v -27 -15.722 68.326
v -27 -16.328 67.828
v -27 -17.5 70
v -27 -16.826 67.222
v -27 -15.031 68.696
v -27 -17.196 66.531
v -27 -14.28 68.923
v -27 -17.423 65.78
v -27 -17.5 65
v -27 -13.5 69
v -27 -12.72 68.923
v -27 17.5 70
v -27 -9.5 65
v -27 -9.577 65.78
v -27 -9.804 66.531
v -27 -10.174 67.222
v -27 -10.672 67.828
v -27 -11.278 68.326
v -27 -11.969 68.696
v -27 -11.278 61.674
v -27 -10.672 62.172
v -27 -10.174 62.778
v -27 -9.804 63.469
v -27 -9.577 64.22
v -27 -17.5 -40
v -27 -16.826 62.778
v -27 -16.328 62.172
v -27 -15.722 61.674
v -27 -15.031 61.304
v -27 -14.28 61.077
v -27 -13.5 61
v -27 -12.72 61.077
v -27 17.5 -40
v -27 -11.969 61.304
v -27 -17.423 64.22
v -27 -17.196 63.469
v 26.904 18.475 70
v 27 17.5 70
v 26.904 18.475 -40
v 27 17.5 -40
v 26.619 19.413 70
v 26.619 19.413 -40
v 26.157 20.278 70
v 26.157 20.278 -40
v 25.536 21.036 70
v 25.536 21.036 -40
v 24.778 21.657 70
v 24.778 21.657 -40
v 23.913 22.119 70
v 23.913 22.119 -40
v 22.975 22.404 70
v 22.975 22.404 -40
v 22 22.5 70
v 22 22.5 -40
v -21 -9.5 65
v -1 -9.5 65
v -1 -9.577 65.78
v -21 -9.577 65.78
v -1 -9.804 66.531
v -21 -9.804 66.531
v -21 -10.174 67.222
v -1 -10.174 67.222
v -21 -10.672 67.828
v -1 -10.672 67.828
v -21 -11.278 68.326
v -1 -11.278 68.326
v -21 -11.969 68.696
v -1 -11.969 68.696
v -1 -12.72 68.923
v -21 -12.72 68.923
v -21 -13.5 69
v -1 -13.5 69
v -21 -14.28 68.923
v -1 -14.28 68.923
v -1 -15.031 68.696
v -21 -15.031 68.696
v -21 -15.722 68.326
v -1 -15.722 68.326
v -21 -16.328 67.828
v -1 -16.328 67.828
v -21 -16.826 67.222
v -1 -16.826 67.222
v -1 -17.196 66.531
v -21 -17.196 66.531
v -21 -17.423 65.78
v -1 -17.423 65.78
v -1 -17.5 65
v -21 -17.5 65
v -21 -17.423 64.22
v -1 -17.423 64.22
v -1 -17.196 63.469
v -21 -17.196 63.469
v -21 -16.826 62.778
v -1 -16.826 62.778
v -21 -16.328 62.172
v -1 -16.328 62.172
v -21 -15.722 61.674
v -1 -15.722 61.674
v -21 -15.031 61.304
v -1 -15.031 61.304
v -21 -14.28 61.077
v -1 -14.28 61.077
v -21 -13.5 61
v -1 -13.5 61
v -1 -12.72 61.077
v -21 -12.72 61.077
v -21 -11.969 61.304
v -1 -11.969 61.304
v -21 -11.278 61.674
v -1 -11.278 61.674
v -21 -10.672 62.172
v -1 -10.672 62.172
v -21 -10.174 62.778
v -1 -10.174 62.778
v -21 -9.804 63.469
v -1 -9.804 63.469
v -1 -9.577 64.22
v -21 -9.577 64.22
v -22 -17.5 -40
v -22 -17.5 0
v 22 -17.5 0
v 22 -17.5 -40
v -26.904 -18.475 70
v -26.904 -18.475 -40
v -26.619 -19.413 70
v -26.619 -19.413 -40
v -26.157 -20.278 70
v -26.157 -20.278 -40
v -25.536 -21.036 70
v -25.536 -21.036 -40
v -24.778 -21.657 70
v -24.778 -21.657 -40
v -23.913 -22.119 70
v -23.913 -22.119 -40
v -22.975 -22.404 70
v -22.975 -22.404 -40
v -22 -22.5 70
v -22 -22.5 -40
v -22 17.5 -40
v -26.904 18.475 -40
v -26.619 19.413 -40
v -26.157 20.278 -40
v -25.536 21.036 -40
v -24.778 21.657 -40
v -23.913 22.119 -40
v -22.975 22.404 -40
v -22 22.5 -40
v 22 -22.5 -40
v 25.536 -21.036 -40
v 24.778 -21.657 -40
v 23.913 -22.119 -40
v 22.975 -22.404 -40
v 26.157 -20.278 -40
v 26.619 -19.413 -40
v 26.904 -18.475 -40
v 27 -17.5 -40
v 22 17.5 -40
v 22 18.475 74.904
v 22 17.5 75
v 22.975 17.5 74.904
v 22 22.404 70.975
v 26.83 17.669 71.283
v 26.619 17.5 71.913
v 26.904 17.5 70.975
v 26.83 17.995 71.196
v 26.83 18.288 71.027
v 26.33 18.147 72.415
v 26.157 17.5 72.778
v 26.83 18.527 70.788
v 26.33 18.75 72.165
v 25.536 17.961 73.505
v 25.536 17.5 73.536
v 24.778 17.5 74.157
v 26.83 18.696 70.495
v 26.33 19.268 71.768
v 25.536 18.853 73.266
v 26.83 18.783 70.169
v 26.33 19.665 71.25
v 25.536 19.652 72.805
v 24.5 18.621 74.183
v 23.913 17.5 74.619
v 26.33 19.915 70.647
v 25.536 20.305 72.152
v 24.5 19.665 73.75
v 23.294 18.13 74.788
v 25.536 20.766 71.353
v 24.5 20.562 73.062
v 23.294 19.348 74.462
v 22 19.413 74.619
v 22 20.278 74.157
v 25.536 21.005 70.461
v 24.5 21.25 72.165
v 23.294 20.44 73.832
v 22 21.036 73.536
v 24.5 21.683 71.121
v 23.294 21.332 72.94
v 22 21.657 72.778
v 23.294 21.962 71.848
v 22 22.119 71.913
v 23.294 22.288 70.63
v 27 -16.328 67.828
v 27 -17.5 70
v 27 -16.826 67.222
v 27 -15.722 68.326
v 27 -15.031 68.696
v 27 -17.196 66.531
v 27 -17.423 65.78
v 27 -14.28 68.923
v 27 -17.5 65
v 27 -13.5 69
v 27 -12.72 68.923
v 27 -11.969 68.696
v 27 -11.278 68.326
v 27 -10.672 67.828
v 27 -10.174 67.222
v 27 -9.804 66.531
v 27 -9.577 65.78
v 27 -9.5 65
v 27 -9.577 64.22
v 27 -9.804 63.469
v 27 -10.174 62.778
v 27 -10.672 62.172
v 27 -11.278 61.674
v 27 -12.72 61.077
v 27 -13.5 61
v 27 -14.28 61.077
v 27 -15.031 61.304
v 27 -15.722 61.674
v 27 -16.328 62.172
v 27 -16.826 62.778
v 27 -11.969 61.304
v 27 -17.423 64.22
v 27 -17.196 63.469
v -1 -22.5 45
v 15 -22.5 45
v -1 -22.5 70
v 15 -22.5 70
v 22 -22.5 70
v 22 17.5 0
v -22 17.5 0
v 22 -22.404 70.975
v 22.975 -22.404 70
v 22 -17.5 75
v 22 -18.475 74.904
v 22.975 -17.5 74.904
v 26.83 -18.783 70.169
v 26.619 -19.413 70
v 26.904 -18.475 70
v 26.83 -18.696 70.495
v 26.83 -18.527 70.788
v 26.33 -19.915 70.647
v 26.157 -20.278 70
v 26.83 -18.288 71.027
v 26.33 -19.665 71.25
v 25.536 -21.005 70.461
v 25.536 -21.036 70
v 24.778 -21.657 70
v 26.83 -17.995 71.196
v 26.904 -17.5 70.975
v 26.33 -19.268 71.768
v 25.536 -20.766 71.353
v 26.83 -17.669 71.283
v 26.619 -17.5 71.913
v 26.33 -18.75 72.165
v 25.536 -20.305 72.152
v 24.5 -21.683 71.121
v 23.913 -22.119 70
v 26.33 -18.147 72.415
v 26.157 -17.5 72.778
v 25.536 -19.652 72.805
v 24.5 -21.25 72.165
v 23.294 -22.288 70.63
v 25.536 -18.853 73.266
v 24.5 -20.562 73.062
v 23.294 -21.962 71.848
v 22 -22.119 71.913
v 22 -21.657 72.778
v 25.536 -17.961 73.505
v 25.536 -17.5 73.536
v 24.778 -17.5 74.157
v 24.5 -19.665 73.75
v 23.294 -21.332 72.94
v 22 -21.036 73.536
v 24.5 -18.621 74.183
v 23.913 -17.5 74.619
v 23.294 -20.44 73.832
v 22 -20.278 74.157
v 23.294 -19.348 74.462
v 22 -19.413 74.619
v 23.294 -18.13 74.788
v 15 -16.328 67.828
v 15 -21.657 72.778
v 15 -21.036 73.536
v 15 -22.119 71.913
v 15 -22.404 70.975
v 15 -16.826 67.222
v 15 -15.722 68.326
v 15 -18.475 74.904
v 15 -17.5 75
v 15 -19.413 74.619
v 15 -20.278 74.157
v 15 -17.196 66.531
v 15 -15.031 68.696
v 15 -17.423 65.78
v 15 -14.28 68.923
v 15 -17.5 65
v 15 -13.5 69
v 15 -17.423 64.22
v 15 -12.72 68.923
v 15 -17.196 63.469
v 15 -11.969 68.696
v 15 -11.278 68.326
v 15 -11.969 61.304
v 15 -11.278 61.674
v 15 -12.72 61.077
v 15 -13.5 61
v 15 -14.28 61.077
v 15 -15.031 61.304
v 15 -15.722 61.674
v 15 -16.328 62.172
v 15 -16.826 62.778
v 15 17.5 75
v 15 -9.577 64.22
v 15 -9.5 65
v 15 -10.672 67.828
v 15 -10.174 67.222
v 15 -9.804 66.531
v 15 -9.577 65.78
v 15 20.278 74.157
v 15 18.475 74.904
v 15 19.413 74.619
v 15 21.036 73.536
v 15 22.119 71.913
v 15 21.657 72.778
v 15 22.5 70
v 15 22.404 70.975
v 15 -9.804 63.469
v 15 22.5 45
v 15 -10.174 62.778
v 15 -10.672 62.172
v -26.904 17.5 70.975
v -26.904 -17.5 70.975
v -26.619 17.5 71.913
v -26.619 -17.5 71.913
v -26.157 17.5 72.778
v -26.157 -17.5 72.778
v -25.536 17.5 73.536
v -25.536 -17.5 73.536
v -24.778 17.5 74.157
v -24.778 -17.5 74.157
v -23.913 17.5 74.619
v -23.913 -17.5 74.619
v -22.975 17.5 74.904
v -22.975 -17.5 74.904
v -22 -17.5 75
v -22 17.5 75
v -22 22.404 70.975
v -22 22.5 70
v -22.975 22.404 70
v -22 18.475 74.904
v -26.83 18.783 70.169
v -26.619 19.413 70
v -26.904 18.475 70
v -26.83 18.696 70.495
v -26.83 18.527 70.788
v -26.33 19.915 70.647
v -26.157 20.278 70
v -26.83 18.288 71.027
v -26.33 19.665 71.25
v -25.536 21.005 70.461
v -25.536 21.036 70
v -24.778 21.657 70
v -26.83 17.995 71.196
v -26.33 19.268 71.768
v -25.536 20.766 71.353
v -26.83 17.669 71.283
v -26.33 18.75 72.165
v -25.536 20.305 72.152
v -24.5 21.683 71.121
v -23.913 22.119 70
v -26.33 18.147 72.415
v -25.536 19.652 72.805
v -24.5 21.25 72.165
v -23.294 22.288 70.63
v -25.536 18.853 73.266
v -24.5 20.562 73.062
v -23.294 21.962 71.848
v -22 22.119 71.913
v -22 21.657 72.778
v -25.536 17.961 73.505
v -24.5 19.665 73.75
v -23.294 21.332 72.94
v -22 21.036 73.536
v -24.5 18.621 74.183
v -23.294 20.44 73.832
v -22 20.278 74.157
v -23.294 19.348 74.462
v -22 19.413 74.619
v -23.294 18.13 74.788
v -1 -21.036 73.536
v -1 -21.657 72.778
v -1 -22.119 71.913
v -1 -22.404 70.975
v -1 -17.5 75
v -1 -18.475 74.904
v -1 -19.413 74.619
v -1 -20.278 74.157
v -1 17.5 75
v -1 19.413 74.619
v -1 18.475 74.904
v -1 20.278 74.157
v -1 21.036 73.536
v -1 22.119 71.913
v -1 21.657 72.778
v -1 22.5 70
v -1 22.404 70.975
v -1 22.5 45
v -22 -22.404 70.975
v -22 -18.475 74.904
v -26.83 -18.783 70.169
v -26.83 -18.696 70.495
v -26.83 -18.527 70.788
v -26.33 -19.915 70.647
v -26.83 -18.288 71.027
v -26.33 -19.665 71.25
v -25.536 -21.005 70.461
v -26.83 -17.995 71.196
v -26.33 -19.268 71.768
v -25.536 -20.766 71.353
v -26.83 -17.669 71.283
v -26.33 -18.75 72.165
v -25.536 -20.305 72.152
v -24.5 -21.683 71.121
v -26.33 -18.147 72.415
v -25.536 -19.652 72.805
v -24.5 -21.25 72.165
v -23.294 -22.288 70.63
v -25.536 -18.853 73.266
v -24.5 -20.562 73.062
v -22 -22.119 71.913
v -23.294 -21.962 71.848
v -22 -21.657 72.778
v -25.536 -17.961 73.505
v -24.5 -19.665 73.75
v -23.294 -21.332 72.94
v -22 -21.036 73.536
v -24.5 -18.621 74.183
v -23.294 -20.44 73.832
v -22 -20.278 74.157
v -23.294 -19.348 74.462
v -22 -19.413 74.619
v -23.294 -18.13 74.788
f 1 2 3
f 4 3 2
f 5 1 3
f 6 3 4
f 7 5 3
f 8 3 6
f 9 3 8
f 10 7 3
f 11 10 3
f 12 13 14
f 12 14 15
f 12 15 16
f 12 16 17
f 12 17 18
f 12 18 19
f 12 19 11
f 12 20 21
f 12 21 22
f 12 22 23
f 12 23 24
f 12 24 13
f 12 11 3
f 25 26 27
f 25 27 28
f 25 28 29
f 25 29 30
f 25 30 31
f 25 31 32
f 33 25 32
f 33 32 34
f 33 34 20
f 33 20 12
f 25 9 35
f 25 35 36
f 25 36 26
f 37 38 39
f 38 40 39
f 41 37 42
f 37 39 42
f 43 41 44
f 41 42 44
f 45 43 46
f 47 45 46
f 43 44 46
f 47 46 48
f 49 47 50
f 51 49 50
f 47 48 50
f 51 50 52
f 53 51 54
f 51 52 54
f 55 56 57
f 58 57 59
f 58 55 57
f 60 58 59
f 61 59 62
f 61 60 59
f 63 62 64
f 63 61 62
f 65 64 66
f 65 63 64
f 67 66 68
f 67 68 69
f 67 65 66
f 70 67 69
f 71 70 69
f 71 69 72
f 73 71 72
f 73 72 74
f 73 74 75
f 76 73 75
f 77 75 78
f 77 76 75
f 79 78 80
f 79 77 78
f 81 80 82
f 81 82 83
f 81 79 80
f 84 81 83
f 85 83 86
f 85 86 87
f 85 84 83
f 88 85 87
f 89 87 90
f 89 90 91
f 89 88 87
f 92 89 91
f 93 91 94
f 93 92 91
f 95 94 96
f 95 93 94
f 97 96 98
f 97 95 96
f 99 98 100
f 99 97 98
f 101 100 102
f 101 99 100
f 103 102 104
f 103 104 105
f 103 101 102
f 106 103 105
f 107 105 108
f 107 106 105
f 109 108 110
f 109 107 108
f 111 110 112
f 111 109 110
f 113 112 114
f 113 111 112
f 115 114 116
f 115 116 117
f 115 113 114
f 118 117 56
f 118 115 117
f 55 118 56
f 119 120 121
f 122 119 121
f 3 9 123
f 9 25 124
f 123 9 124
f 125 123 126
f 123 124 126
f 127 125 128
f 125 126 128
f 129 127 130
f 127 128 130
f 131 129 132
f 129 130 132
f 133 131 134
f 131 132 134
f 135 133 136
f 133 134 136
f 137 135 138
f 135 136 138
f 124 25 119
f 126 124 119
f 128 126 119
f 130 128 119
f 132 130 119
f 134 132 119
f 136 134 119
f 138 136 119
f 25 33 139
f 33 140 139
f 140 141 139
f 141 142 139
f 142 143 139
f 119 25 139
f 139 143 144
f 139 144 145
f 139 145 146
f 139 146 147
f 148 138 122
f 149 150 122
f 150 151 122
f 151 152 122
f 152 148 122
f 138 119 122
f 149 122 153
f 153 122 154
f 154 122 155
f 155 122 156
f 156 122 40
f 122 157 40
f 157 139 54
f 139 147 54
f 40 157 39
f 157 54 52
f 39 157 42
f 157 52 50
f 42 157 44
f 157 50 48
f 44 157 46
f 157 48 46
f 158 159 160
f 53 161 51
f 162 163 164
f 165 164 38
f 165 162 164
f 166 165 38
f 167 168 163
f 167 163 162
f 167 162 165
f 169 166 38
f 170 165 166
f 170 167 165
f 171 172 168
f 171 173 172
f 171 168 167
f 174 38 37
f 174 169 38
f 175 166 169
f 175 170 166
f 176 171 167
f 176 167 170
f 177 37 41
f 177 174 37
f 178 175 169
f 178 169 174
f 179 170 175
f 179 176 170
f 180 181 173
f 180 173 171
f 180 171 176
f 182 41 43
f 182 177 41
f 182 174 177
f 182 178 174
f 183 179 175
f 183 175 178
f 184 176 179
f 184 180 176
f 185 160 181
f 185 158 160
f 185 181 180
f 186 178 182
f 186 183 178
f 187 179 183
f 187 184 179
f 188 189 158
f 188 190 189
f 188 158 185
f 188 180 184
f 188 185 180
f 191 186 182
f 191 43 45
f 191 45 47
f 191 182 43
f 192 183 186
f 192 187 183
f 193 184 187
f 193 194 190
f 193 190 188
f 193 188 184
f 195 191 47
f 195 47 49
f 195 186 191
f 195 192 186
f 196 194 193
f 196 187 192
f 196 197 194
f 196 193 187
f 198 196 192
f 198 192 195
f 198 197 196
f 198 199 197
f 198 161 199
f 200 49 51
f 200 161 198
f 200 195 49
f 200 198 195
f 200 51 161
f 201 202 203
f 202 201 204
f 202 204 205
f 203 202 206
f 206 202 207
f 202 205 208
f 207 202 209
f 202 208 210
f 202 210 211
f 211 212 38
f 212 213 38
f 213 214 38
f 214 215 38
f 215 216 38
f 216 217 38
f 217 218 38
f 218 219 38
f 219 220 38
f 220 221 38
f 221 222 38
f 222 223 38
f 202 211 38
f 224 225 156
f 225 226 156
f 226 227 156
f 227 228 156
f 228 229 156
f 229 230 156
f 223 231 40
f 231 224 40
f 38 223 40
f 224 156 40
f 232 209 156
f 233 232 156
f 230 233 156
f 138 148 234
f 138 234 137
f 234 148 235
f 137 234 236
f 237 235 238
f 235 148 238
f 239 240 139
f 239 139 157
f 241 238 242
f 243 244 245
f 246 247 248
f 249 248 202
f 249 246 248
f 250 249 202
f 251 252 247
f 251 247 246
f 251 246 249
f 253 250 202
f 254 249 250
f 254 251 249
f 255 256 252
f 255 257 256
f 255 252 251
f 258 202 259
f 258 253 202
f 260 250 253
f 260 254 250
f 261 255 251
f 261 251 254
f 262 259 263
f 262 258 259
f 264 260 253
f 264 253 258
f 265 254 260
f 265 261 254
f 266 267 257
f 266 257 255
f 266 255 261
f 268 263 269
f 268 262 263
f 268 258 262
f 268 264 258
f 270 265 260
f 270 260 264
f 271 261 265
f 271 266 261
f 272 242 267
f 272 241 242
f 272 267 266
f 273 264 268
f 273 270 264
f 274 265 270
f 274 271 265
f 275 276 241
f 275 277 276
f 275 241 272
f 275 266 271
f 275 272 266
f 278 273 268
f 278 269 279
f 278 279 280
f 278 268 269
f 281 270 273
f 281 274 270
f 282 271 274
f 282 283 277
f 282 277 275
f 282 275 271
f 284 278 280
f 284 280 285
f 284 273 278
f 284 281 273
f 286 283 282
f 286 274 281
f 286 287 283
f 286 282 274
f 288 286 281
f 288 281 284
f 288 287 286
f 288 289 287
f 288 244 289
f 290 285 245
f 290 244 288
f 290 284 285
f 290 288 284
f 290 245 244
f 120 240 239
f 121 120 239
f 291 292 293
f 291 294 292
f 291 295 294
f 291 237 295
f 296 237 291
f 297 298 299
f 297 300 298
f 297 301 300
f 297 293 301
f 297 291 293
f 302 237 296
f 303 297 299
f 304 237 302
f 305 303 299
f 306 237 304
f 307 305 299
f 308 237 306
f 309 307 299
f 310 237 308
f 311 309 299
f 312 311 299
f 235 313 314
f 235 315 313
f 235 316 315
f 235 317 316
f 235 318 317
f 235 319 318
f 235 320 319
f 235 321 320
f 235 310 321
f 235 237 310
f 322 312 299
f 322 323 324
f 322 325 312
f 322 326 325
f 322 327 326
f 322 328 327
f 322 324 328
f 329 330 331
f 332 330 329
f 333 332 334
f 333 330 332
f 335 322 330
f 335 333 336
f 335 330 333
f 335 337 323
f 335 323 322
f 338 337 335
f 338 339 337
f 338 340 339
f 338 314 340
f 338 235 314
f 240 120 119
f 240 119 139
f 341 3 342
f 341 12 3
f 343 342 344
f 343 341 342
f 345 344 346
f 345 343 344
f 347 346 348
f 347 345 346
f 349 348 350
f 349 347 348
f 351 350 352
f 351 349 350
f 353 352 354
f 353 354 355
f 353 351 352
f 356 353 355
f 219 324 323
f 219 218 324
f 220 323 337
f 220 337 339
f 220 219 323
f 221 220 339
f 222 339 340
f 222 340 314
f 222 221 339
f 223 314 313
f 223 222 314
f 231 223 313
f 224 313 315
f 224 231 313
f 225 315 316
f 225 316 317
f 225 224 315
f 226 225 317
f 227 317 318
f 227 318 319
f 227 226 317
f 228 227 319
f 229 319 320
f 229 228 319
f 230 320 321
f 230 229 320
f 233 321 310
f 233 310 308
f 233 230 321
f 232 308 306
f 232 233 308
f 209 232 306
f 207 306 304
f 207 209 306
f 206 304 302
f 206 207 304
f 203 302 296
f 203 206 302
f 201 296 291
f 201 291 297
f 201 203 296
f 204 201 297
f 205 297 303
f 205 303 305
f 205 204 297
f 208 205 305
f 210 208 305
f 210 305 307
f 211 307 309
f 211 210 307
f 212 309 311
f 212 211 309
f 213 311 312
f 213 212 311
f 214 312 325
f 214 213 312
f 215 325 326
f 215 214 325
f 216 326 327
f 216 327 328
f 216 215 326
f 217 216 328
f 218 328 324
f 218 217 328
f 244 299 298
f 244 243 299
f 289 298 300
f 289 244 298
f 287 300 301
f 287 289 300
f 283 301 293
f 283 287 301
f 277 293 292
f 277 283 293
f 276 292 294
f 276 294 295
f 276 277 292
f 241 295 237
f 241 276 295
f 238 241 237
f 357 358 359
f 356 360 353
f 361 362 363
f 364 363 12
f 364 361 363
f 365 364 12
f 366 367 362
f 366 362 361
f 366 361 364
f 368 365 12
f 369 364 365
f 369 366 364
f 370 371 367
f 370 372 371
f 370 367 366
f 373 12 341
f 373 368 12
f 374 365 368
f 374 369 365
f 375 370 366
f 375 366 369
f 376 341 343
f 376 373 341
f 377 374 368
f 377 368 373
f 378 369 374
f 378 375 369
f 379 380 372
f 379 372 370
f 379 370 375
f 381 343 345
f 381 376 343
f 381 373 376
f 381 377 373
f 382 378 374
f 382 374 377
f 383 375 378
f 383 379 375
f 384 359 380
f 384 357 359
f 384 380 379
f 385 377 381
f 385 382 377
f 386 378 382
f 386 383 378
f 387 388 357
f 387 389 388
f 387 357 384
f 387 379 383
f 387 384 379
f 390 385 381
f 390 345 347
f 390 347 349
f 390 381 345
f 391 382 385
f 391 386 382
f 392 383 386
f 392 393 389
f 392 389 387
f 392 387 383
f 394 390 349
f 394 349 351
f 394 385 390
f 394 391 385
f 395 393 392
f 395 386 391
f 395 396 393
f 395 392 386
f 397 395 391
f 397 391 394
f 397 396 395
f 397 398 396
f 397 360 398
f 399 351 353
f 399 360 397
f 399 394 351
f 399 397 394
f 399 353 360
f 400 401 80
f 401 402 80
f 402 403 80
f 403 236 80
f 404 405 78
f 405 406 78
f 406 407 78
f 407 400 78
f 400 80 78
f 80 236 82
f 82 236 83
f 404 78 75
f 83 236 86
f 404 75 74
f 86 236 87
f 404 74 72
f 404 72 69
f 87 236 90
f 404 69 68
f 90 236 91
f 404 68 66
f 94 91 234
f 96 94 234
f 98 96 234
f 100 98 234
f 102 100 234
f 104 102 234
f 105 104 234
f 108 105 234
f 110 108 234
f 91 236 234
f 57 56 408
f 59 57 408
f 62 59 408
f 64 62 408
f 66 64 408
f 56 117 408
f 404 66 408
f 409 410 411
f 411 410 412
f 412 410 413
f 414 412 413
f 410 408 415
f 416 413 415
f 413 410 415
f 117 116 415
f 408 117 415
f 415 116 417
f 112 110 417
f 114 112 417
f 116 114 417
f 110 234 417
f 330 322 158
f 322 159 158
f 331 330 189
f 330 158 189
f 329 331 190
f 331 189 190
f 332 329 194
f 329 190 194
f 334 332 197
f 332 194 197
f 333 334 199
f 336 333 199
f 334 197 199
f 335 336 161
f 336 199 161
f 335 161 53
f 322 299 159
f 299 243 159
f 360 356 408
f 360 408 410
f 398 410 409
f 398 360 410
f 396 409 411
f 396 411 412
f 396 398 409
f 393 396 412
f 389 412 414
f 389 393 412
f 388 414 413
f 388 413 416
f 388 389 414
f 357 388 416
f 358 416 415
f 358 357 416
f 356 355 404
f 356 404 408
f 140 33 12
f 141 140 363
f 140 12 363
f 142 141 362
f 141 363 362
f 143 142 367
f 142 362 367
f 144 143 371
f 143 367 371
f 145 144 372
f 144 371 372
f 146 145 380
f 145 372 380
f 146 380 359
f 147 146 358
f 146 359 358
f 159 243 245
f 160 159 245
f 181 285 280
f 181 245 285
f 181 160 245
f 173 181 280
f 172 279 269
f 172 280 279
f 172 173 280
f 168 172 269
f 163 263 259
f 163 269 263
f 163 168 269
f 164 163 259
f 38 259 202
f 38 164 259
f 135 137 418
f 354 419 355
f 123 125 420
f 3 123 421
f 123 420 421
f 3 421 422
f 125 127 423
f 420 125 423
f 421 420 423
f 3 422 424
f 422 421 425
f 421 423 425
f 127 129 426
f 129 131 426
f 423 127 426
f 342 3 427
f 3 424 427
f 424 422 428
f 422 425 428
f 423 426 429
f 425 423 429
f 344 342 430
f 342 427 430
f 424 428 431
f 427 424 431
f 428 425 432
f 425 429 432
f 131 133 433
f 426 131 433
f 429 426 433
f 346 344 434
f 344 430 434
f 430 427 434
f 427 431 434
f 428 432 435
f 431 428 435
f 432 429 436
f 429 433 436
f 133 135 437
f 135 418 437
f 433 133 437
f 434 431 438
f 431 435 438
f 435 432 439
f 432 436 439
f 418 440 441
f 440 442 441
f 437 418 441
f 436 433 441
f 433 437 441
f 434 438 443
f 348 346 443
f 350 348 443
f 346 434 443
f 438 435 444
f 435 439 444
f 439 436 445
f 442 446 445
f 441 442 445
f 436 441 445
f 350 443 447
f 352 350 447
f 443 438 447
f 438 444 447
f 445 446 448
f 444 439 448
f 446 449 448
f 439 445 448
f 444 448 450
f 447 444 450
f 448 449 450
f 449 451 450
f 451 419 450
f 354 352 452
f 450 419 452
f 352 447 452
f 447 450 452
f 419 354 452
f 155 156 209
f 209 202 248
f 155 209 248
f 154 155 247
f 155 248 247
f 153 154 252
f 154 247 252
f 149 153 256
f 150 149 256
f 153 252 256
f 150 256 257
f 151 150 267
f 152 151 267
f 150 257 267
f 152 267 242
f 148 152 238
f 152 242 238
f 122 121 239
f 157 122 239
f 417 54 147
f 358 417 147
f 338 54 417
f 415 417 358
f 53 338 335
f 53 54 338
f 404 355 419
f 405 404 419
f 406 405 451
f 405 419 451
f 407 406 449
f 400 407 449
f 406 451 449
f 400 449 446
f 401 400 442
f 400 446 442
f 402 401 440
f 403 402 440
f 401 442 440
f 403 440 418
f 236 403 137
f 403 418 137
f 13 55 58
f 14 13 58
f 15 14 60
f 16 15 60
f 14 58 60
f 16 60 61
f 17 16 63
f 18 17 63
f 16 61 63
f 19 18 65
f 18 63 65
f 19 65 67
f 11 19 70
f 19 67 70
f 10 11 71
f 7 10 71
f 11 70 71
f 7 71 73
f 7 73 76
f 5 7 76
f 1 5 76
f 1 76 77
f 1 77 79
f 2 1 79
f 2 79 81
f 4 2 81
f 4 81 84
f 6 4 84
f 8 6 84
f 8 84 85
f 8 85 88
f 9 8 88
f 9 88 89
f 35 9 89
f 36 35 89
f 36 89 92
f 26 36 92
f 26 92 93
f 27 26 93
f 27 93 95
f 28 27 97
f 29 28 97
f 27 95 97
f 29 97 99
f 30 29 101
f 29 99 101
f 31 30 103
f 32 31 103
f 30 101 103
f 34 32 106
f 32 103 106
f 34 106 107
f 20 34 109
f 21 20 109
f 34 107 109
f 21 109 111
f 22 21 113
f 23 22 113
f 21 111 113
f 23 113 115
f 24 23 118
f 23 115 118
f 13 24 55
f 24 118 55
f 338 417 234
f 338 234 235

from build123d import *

# Parameters (mm, degrees)
F0_W          = 54
F0_H          = 45
F0_W_2        = 44
F0_H_2        = 35
F1_DEPTH      = 40
F2_DEPTH      = 5
F3_W          = 6
F3_H          = 45
F4_DEPTH      = 70
F6_R          = 5
F7_DEPTH      = 40
F5_R          = 4
F8_DEPTH      = 48.001
F8_DEPTH_BACK = 25
F9_DEPTH      = 20
F10_DEPTH     = 6


with BuildPart() as f1:
    # F0 (on Top) → F1 (new body)
    with BuildSketch(Plane.XY):
        Rectangle(F0_W, F0_H)
        Rectangle(F0_W_2, F0_H_2, mode=Mode.SUBTRACT)
    extrude(amount=-F1_DEPTH)

    # F0 (on Top) → F2 (join)
    with BuildSketch(Plane.XY):
        Rectangle(F0_W, F0_H)
        Rectangle(F0_W_2, F0_H_2, mode=Mode.SUBTRACT)
        Rectangle(F0_W_2, F0_H_2)
    extrude(amount=F2_DEPTH)

    # F3 (on face) → F4 (join)
    with BuildSketch(Plane.XY.offset(5)):
        with Locations((24, 0)):
            Rectangle(F3_W, F3_H)
        with Locations((-24, 0)):
            Rectangle(F3_W, F3_H)
    extrude(amount=F4_DEPTH)

    # F6
    f6_edges = [f1.edges().sort_by_distance(p)[0] for p in [
        (-24, -22.5, 75),
        (-24, 22.5, 75),
        (24, -22.5, 75),
        (24, 22.5, 75),
        (27, -22.5, 17.5),
        (27, 0, 75),
        (27, 22.5, 17.5),
        (-27, -22.5, 17.5),
        (-27, 22.5, 17.5),
        (-27, 0, 75),
    ]]
    fillet(f6_edges, radius=F6_R)

    # F7 (add): a face of the model
    f7_faces = [f1.faces().sort_by_distance(p)[0] for p in [
        (0, 0, 5),
    ]]
    extrude(f7_faces, amount=F7_DEPTH)

    # F5 (on face) → F8 (cut, two sides)
    with BuildSketch(Plane.YZ.offset(-21)) as f8_sk:
        with Locations((-13.5, 65)):
            Circle(F5_R)
    extrude(amount=F8_DEPTH, mode=Mode.SUBTRACT)
    extrude(f8_sk.sketch, amount=-F8_DEPTH_BACK, mode=Mode.SUBTRACT)

    # F9 (add): a face of the model
    f9_faces = [f1.faces().sort_by_distance(p)[0] for p in [
        (-21, 0.526440406, 59.6894541328),
    ]]
    extrude(f9_faces, amount=F9_DEPTH)

    # F10 (add): a face of the model
    f10_faces = [f1.faces().sort_by_distance(p)[0] for p in [
        (21, 0.526440406, 59.6894541328),
    ]]
    extrude(f10_faces, amount=F10_DEPTH)


solid = f1.part
